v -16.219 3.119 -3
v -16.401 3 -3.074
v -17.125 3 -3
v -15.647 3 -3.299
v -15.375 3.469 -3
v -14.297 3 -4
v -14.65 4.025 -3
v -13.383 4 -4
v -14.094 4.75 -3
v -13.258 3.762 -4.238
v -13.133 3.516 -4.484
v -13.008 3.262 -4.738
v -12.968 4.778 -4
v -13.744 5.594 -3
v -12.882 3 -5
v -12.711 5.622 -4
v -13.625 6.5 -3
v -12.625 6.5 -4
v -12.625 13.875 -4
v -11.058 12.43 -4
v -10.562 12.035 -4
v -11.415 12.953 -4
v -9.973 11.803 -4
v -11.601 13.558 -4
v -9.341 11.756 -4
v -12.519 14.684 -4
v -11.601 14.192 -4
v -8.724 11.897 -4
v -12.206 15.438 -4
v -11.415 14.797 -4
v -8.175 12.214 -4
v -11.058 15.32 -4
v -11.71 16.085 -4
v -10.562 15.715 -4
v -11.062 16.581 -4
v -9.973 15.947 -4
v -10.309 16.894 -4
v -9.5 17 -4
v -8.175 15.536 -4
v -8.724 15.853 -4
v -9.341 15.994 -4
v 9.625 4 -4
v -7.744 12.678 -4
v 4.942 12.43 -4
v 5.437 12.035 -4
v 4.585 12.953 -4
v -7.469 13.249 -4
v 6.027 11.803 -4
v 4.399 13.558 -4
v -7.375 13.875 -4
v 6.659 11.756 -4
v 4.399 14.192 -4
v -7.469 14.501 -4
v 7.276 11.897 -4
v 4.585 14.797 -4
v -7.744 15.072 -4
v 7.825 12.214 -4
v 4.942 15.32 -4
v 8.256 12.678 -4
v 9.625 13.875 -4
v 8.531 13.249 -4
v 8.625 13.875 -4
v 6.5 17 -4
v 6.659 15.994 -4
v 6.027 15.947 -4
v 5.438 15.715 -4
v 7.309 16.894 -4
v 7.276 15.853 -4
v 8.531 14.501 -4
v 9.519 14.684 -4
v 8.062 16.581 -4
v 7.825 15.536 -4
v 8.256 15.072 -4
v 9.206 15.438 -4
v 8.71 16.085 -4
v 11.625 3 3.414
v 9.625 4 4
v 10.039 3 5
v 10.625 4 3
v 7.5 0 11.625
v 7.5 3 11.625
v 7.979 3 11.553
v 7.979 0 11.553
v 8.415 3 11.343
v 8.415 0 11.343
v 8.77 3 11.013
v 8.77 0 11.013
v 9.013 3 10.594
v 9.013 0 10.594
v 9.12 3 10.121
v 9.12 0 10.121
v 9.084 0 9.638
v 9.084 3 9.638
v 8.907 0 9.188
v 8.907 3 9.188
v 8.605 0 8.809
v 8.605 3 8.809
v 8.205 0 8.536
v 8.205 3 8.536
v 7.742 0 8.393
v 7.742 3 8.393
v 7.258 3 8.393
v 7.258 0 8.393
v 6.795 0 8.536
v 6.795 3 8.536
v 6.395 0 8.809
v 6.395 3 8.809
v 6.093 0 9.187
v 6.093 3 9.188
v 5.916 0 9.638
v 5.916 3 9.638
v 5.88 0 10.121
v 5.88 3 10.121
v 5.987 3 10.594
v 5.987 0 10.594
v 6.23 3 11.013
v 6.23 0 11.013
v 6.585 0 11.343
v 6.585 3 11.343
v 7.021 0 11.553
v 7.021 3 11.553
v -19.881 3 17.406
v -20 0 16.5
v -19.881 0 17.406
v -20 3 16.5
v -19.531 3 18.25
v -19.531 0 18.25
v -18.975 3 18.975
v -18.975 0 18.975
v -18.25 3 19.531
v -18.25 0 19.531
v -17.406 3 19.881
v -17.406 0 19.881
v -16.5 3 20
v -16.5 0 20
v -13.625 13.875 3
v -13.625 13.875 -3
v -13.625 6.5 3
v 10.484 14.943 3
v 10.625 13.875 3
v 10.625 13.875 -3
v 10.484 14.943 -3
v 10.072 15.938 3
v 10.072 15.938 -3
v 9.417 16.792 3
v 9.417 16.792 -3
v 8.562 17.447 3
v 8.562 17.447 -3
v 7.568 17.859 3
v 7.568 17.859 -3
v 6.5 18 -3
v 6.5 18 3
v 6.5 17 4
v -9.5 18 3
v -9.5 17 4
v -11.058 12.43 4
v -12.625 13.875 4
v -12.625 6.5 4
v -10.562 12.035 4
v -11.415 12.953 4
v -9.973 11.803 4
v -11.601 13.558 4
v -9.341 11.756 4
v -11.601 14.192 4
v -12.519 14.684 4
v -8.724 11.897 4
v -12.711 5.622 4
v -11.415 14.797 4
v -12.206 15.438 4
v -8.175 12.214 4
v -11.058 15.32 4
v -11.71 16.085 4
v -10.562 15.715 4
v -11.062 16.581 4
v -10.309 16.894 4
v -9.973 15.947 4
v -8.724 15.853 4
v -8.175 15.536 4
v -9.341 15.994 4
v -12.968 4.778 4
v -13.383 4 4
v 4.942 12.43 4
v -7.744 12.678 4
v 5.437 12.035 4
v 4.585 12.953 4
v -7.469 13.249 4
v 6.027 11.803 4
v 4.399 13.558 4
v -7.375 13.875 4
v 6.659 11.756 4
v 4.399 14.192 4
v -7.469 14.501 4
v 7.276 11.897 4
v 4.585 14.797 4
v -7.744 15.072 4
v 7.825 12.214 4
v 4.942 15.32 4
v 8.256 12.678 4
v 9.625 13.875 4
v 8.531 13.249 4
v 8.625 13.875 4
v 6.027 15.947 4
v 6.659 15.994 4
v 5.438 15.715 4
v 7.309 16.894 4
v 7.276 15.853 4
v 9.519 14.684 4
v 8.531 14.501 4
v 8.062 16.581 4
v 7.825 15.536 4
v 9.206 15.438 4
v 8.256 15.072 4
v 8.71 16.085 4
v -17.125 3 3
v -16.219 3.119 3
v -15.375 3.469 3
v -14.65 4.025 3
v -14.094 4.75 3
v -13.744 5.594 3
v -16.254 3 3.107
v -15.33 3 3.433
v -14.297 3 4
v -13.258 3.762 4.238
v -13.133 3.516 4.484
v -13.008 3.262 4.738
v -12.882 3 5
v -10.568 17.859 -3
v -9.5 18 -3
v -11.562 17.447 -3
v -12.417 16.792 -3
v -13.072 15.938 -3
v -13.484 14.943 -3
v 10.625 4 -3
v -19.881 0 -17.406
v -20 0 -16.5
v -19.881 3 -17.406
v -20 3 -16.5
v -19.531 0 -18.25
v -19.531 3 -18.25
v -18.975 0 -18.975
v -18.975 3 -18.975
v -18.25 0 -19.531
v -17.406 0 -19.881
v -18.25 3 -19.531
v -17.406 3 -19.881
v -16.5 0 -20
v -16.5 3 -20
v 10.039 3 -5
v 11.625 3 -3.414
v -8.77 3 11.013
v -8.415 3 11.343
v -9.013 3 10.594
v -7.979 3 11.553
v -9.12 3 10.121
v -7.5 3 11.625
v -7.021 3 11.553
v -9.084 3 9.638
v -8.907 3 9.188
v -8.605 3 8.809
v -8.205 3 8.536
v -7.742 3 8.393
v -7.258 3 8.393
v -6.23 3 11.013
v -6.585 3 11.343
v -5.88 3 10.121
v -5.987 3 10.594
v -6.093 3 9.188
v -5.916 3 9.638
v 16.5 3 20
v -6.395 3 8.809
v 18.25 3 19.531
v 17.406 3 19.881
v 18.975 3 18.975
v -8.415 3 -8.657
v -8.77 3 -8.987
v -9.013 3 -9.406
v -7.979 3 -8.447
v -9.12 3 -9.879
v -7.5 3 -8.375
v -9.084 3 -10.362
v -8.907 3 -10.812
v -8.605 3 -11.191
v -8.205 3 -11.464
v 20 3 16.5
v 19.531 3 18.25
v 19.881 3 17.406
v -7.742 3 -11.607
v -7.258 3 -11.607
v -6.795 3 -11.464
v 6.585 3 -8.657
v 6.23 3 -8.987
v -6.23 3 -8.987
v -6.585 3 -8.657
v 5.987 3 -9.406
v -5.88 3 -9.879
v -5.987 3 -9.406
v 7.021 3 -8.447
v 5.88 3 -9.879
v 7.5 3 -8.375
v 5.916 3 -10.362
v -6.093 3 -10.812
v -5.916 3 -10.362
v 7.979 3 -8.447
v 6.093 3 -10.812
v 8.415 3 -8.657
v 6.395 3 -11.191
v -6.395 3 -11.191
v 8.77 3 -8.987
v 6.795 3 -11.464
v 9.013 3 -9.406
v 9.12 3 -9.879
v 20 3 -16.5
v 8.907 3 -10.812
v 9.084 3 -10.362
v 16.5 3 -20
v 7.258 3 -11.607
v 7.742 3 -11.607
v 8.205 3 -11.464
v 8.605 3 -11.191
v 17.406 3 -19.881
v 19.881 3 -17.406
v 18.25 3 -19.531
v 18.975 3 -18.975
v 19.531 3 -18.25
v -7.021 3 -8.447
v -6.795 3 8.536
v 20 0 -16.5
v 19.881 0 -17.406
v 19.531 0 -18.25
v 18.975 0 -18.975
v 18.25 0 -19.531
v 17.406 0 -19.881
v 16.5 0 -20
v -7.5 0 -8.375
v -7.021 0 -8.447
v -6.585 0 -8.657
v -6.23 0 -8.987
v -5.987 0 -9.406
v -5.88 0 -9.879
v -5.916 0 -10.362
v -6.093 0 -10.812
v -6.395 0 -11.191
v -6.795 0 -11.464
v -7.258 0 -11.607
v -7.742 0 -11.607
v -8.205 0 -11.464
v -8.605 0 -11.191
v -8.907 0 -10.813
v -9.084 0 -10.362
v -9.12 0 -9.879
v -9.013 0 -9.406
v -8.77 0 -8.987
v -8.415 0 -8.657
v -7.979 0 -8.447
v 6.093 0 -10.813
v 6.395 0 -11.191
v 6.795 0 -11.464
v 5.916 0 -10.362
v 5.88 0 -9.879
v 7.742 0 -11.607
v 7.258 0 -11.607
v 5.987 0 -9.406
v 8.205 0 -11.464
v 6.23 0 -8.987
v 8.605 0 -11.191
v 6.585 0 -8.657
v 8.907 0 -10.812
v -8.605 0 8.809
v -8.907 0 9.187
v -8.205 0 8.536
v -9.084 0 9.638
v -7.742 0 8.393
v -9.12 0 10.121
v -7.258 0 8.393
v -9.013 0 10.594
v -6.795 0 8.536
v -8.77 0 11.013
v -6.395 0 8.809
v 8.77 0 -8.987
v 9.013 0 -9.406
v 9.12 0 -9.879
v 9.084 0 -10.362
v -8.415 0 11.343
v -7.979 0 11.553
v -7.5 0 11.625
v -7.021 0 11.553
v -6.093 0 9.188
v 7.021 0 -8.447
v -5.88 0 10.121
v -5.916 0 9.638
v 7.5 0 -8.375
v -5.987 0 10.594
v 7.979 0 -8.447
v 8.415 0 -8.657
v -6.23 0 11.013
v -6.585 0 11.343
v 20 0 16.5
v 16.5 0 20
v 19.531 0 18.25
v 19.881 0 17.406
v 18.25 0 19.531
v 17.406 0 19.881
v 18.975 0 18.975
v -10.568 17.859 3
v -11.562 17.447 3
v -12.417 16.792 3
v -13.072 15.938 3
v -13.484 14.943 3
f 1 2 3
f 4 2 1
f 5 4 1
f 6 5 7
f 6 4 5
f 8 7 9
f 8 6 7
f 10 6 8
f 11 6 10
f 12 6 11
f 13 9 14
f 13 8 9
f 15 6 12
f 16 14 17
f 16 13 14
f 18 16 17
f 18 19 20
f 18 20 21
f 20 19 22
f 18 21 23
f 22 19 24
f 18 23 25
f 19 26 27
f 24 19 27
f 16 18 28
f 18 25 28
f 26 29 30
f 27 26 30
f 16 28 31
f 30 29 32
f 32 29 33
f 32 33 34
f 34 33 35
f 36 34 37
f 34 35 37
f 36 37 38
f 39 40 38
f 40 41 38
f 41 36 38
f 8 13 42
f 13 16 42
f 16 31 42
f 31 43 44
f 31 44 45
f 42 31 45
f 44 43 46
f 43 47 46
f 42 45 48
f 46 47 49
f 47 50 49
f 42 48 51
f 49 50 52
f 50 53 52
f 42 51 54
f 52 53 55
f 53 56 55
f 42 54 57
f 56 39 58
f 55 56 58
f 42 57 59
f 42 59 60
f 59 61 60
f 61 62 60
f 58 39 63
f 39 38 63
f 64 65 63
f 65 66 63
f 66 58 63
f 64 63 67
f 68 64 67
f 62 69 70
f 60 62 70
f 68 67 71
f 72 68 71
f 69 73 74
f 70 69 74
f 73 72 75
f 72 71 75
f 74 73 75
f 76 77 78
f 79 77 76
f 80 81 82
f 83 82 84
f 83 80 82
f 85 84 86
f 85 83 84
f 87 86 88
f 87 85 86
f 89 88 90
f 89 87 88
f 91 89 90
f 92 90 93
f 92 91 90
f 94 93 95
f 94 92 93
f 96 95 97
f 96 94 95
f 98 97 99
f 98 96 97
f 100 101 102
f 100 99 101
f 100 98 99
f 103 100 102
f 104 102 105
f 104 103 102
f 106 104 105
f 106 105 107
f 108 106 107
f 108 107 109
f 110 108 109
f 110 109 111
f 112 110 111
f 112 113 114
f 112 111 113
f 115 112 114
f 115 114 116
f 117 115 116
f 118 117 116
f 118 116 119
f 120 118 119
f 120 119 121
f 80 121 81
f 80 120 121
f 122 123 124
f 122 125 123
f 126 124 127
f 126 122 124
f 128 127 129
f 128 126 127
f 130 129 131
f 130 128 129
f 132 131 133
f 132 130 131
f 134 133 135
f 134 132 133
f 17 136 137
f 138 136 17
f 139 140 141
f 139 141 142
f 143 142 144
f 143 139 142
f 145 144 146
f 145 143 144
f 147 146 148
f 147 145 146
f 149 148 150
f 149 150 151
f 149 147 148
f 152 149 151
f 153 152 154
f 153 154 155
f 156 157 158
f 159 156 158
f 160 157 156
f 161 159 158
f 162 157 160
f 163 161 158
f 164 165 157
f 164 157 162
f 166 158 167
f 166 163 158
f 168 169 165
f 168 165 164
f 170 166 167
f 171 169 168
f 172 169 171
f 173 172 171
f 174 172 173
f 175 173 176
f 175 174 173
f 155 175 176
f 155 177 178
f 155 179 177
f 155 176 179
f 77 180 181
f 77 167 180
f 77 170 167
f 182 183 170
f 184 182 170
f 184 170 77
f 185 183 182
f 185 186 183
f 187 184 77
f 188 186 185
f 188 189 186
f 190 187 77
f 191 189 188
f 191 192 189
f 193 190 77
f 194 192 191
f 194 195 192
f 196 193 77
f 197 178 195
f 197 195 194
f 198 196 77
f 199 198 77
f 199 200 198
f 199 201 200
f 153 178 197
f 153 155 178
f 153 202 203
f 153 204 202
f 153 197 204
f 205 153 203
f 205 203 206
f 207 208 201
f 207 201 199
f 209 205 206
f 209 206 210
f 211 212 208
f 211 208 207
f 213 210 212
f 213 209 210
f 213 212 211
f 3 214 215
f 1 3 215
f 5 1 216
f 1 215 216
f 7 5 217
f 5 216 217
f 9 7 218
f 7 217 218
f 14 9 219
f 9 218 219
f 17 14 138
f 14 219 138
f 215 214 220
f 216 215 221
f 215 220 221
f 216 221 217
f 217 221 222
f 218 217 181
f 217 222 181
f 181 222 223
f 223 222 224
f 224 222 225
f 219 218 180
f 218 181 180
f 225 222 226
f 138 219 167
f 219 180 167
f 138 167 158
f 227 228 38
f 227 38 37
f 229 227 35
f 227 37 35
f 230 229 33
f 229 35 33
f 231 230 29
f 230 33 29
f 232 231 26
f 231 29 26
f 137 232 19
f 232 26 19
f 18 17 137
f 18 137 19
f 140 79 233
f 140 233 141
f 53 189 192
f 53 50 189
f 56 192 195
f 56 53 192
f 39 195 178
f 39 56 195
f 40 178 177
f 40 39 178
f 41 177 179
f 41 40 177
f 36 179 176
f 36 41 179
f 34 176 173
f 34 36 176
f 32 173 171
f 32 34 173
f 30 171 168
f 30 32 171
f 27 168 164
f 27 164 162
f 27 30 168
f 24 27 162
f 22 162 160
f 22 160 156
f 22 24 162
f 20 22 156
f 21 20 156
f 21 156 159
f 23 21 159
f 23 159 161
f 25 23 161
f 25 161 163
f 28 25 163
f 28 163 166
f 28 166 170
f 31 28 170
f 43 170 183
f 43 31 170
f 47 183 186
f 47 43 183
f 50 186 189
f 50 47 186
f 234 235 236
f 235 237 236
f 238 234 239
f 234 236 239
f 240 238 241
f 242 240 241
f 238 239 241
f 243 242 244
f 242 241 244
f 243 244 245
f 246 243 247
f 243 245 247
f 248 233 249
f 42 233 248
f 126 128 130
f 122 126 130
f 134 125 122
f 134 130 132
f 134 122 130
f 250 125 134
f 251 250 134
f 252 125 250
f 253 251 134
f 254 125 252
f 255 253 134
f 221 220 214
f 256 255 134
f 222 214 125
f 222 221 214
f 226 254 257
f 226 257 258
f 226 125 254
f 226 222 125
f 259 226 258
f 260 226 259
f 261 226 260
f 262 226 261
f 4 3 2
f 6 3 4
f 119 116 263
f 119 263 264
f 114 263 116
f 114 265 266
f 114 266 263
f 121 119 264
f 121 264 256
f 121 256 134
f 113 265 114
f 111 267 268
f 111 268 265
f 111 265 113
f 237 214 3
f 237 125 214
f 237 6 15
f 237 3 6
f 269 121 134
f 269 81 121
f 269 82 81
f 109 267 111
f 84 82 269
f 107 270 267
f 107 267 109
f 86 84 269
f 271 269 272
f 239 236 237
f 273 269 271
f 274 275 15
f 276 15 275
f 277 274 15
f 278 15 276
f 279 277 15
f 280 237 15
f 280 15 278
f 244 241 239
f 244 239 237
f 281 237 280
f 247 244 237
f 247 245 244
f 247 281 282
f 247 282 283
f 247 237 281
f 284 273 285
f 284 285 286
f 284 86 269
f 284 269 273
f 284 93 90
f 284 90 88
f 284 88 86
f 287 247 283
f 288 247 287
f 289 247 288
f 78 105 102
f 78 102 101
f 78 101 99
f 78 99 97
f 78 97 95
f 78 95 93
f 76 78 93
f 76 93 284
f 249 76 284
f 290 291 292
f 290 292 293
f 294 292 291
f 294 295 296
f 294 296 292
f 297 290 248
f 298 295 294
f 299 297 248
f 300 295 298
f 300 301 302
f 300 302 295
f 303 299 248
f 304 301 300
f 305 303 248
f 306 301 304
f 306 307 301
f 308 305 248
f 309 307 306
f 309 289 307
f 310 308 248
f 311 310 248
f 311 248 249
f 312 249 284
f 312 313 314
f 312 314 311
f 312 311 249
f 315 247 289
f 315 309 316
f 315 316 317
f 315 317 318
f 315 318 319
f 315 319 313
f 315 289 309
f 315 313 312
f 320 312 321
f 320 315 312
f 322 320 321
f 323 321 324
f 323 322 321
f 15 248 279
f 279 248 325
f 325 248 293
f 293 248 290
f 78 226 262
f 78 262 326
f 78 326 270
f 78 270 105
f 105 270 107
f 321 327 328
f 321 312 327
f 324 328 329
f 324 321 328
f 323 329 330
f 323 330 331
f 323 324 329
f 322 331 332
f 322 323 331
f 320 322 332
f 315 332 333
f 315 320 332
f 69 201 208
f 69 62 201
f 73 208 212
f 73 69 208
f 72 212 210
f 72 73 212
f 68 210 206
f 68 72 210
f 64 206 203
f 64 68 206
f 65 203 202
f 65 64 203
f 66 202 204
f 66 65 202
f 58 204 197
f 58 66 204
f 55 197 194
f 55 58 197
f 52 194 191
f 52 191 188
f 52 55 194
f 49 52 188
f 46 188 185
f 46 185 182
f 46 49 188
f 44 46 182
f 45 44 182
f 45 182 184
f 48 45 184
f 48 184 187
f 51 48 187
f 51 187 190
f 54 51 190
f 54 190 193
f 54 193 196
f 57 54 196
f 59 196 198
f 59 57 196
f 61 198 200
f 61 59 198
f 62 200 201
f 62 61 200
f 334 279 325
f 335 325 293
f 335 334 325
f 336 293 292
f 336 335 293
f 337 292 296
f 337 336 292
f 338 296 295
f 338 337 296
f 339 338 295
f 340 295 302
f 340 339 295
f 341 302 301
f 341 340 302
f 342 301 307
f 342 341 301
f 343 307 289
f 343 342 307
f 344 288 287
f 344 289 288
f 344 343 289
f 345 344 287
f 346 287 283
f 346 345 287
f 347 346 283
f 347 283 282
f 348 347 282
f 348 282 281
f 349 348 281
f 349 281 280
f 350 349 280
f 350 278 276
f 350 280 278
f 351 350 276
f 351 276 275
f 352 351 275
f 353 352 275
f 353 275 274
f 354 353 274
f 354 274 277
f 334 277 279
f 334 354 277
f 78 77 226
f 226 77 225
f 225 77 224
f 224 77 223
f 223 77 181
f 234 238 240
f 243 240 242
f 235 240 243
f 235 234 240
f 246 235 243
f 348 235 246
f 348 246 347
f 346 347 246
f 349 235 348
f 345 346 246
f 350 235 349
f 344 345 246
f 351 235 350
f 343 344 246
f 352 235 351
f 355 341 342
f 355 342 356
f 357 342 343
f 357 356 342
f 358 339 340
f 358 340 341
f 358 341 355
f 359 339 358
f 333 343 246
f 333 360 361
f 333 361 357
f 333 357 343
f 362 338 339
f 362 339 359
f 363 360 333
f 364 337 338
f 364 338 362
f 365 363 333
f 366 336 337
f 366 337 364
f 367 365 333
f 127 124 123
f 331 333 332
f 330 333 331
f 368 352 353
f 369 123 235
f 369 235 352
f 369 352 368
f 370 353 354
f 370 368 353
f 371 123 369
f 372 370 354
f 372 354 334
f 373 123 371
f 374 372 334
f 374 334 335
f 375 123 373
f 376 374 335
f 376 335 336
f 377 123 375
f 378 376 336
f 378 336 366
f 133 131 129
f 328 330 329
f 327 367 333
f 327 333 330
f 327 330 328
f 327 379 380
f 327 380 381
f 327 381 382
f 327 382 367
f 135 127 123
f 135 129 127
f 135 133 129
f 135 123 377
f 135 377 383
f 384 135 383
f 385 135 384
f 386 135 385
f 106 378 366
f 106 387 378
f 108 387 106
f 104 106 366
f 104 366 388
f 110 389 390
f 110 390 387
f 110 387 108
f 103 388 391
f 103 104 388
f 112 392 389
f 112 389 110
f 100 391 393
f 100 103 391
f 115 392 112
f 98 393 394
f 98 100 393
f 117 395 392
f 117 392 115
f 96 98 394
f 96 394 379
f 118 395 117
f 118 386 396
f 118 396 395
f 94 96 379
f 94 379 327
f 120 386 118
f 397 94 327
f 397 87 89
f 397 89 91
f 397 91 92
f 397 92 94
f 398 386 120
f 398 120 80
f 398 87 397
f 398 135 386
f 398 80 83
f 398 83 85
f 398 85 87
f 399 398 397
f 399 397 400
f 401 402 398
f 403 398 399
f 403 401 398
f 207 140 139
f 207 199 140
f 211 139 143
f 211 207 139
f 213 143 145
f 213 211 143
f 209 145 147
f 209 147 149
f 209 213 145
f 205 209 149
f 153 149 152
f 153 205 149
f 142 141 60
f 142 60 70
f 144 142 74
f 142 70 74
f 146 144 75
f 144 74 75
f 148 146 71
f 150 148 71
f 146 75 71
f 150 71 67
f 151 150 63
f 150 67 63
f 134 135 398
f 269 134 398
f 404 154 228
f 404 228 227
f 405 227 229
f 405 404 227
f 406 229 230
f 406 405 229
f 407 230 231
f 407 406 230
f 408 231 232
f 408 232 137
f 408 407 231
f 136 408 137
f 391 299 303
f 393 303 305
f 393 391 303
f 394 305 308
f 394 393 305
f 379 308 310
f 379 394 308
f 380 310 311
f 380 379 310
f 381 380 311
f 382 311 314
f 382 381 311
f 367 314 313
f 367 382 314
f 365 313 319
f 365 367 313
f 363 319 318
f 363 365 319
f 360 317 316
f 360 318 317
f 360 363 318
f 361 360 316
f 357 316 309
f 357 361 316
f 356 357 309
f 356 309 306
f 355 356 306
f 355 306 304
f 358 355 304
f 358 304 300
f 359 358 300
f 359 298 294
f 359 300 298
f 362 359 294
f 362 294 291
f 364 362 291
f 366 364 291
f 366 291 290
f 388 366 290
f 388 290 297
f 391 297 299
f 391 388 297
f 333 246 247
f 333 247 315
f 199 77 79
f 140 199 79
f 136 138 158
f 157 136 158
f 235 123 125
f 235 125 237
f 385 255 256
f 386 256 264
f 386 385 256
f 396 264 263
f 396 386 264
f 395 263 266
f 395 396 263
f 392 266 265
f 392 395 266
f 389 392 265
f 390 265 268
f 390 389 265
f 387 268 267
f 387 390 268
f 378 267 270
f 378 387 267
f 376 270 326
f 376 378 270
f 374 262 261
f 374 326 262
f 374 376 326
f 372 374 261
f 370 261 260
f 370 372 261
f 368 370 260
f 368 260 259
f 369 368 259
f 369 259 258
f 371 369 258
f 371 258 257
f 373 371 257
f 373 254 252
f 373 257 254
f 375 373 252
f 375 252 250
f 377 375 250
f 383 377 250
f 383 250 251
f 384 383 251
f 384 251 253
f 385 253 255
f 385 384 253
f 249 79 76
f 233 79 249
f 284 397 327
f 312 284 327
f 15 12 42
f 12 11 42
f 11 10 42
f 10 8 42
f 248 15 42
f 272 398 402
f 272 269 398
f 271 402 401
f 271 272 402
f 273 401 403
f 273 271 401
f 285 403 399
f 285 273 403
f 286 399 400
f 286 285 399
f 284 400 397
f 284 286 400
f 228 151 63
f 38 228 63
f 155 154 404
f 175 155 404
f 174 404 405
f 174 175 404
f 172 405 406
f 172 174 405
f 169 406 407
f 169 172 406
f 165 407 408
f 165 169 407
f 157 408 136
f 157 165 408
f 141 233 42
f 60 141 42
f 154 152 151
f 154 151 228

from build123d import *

# Parameters (mm, degrees)
SKETCH1_W           = 40
SKETCH1_H           = 40
BOSS_EXTRUDE1_DEPTH = 3
FILLET1_R           = 3.5
SKETCH2_R           = 2.125
BOSS_EXTRUDE2_DEPTH = 4
FILLET2_R           = 3.5
CHAMFER1_SIZE       = 1
CHAMFER2_SIZE       = 1
SKETCH4_R           = 1.625
CUT_EXTRUDE4_DEPTH  = 10


with BuildPart() as part:
    # Sketch1 → Boss-Extrude1 (new body)
    with BuildSketch(Plane(origin=(0, 0, 0), x_dir=(1, 0, 0), z_dir=(0, 1, 0))):
        Rectangle(SKETCH1_W, SKETCH1_H)
    extrude(amount=BOSS_EXTRUDE1_DEPTH)

    # Fillet1
    fillet1_edges = [part.edges().sort_by_distance(p)[0] for p in [
        (-20, 1.5, 20),
        (-20, 1.5, -20),
        (20, 1.5, -20),
        (20, 1.5, 20),
    ]]
    fillet(fillet1_edges, radius=FILLET1_R)

    # Sketch2 → Boss-Extrude2 (add, symmetric)
    with BuildSketch(Plane.XY):
        with BuildLine():
            Line((-1.5, 0), (10.625, 0))
            Line((10.625, 0), (10.625, 13.875))
            ThreePointArc((10.625, 13.875), (9.416815472, 16.791815472), (6.5, 18))
            Line((6.5, 18), (-9.5, 18))
            ThreePointArc((-9.5, 18), (-12.416815472, 16.791815472), (-13.625, 13.875))
            Line((-13.625, 13.875), (-13.625, 0))
            Line((-13.625, 0), (-1.5, 0))
        make_face()
        with Locations((-9.5, 13.875)):
            Circle(SKETCH2_R, mode=Mode.SUBTRACT)
        with Locations((6.5, 13.875)):
            Circle(SKETCH2_R, mode=Mode.SUBTRACT)
    extrude(amount=BOSS_EXTRUDE2_DEPTH, both=True)

    # Fillet2
    fillet2_edges = [part.edges().sort_by_distance(p)[0] for p in [
        (-13.625, 3, 0),
    ]]
    fillet(fillet2_edges, radius=FILLET2_R)

    # Chamfer1
    # the kernel refuses this chamfer: 1 mm, written as the material it takes off along each edge
    with BuildSketch(Plane(origin=(-17.125, 6.5, -4), x_dir=(-0.6706329473594386, -0.7417893568365567, 0), z_dir=(-0.7417893568365567, 0.6706329473594386, 0))) as chamfer1_piece_1_section:
        Polygon((3.5, CHAMFER1_SIZE), (3.5 + CHAMFER1_SIZE, 0), (3.5, 0), align=None)
    chamfer1_piece_1 = revolve(axis=Axis((-17.125, 6.5, -4), (0, 0, 1)), revolution_arc=132.115934794, mode=Mode.PRIVATE)
    chamfer1_piece_1 = split(chamfer1_piece_1, bisect_by=Plane(origin=(-14.562264523, 3, -3.629385384), z_dir=(0, 1, 0)), keep=Keep.TOP, mode=Mode.PRIVATE)
    add(chamfer1_piece_1, mode=Mode.SUBTRACT)
    with BuildSketch(Plane(origin=(-17.125, 6.5, 4), x_dir=(-0.6706329473594386, -0.7417893568365567, 0), z_dir=(-0.7417893568365567, 0.6706329473594386, 0))) as chamfer1_piece_2_section:
        Polygon((3.5, -CHAMFER1_SIZE), (3.5 + CHAMFER1_SIZE, 0), (3.5, 0), align=None)
    chamfer1_piece_2 = revolve(axis=Axis((-17.125, 6.5, 4), (0, 0, 1)), revolution_arc=132.115934794, mode=Mode.PRIVATE)
    chamfer1_piece_2 = split(chamfer1_piece_2, bisect_by=Plane(origin=(-14.562264523, 3, 3.629385384), z_dir=(0, 1, 0)), keep=Keep.TOP, mode=Mode.PRIVATE)
    add(chamfer1_piece_2, mode=Mode.SUBTRACT)
    with BuildSketch(Plane(origin=(10.625, 3, 4), x_dir=(-0.9996219169112968, 0, 0.02749587661058651), z_dir=(0, 1, 0)), Plane(origin=(10.625, 3, -4), x_dir=(0.027495876610585623, 0, 0.9996219169112968), z_dir=(0, 1, 0))) as chamfer1_piece_3:
        Polygon((CHAMFER1_SIZE * 0.999621916911, -CHAMFER1_SIZE * 0.0274958766106), (-CHAMFER1_SIZE * 0.0274958766106, -CHAMFER1_SIZE * 0.999621916911), (0, 0), align=None)
    extrude(amount=10.875, mode=Mode.SUBTRACT)
    with BuildSketch(Plane(origin=(6.5, 13.875, 4), x_dir=(1, 0, 0), z_dir=(0, -1, 0))) as chamfer1_piece_4:
        Polygon((4.125, -CHAMFER1_SIZE), (4.125 - CHAMFER1_SIZE, 0), (4.125, 0), align=None)
    revolve(axis=Axis((6.5, 13.875, 4), (0, 0, 1)), revolution_arc=90, mode=Mode.SUBTRACT)
    with BuildSketch(Plane(origin=(6.5, 18, 4), x_dir=(0, 0.027495876610585623, -0.9996219169112968), z_dir=(-1, 0, 0))) as chamfer1_piece_5:
        Polygon((CHAMFER1_SIZE * 0.999621916911, CHAMFER1_SIZE * 0.0274958766106), (-CHAMFER1_SIZE * 0.0274958766106, CHAMFER1_SIZE * 0.999621916911), (0, 0), align=None)
    extrude(amount=16, mode=Mode.SUBTRACT)
    with BuildSketch(Plane(origin=(-9.5, 13.875, 4), x_dir=(0, 1, 0), z_dir=(1, 0, 0))) as chamfer1_piece_6:
        Polygon((4.125, -CHAMFER1_SIZE), (4.125 - CHAMFER1_SIZE, 0), (4.125, 0), align=None)
    revolve(axis=Axis((-9.5, 13.875, 4), (0, 0, 1)), revolution_arc=90, mode=Mode.SUBTRACT)
    with BuildSketch(Plane(origin=(-13.625, 13.875, 4), x_dir=(-0.027495876610585623, 0, -0.9996219169112968), z_dir=(0, -1, 0))) as chamfer1_piece_7:
        Polygon((CHAMFER1_SIZE * 0.999621916911, CHAMFER1_SIZE * 0.0274958766106), (-CHAMFER1_SIZE * 0.0274958766106, CHAMFER1_SIZE * 0.999621916911), (0, 0), align=None)
    extrude(amount=7.375, mode=Mode.SUBTRACT)
    with BuildSketch(Plane(origin=(6.5, 13.875, -4), x_dir=(1, 0, 0), z_dir=(0, -1, 0))) as chamfer1_piece_8:
        Polygon((4.125, CHAMFER1_SIZE), (4.125 - CHAMFER1_SIZE, 0), (4.125, 0), align=None)
    revolve(axis=Axis((6.5, 13.875, -4), (0, 0, 1)), revolution_arc=90, mode=Mode.SUBTRACT)
    with BuildSketch(Plane(origin=(6.5, 18, -4), x_dir=(0, 0.027495876610585623, 0.9996219169112968), z_dir=(-1, 0, 0))) as chamfer1_piece_9:
        Polygon((CHAMFER1_SIZE * 0.999621916911, -CHAMFER1_SIZE * 0.0274958766106), (-CHAMFER1_SIZE * 0.0274958766106, -CHAMFER1_SIZE * 0.999621916911), (0, 0), align=None)
    extrude(amount=16, mode=Mode.SUBTRACT)
    with BuildSketch(Plane(origin=(-9.5, 13.875, -4), x_dir=(0, 1, 0), z_dir=(1, 0, 0))) as chamfer1_piece_10:
        Polygon((4.125, CHAMFER1_SIZE), (4.125 - CHAMFER1_SIZE, 0), (4.125, 0), align=None)
    revolve(axis=Axis((-9.5, 13.875, -4), (0, 0, 1)), revolution_arc=90, mode=Mode.SUBTRACT)
    with BuildSketch(Plane(origin=(-13.625, 13.875, -4), x_dir=(-0.027495876610585623, 0, 0.9996219169112968), z_dir=(0, -1, 0))) as chamfer1_piece_11:
        Polygon((CHAMFER1_SIZE * 0.999621916911, -CHAMFER1_SIZE * 0.0274958766106), (-CHAMFER1_SIZE * 0.0274958766106, -CHAMFER1_SIZE * 0.999621916911), (0, 0), align=None)
    extrude(amount=7.375, mode=Mode.SUBTRACT)

    # Chamfer2
    chamfer2_edges = [part.edges().sort_by_distance(p)[0] for p in [
        (-2.335786438, 3, -4),
        (10.625, 3, 0),
        (-2.335786438, 3, 4),
        (10.125, 3, -3.5),
        (10.125, 3, 3.5),
    ]]
    chamfer(chamfer2_edges, length=CHAMFER2_SIZE)

    # Sketch4 → Cut-Extrude4 (cut)
    with BuildSketch(Plane(origin=(0, 0, 0), x_dir=(1, 0, 0), z_dir=(0, 1, 0))):
        with Locations(Location((-7.5, 10, 0), (0, 0, 270))):
            Circle(SKETCH4_R)
        with Locations(Location((7.5, 10, 0), (0, 0, 270))):
            Circle(SKETCH4_R)
        with Locations(Location((7.5, -10, 0), (0, 0, 270))):
            Circle(SKETCH4_R)
        with Locations(Location((-7.5, -10, 0), (0, 0, 270))):
            Circle(SKETCH4_R)
    extrude(amount=CUT_EXTRUDE4_DEPTH, mode=Mode.SUBTRACT)


solid = part.part
